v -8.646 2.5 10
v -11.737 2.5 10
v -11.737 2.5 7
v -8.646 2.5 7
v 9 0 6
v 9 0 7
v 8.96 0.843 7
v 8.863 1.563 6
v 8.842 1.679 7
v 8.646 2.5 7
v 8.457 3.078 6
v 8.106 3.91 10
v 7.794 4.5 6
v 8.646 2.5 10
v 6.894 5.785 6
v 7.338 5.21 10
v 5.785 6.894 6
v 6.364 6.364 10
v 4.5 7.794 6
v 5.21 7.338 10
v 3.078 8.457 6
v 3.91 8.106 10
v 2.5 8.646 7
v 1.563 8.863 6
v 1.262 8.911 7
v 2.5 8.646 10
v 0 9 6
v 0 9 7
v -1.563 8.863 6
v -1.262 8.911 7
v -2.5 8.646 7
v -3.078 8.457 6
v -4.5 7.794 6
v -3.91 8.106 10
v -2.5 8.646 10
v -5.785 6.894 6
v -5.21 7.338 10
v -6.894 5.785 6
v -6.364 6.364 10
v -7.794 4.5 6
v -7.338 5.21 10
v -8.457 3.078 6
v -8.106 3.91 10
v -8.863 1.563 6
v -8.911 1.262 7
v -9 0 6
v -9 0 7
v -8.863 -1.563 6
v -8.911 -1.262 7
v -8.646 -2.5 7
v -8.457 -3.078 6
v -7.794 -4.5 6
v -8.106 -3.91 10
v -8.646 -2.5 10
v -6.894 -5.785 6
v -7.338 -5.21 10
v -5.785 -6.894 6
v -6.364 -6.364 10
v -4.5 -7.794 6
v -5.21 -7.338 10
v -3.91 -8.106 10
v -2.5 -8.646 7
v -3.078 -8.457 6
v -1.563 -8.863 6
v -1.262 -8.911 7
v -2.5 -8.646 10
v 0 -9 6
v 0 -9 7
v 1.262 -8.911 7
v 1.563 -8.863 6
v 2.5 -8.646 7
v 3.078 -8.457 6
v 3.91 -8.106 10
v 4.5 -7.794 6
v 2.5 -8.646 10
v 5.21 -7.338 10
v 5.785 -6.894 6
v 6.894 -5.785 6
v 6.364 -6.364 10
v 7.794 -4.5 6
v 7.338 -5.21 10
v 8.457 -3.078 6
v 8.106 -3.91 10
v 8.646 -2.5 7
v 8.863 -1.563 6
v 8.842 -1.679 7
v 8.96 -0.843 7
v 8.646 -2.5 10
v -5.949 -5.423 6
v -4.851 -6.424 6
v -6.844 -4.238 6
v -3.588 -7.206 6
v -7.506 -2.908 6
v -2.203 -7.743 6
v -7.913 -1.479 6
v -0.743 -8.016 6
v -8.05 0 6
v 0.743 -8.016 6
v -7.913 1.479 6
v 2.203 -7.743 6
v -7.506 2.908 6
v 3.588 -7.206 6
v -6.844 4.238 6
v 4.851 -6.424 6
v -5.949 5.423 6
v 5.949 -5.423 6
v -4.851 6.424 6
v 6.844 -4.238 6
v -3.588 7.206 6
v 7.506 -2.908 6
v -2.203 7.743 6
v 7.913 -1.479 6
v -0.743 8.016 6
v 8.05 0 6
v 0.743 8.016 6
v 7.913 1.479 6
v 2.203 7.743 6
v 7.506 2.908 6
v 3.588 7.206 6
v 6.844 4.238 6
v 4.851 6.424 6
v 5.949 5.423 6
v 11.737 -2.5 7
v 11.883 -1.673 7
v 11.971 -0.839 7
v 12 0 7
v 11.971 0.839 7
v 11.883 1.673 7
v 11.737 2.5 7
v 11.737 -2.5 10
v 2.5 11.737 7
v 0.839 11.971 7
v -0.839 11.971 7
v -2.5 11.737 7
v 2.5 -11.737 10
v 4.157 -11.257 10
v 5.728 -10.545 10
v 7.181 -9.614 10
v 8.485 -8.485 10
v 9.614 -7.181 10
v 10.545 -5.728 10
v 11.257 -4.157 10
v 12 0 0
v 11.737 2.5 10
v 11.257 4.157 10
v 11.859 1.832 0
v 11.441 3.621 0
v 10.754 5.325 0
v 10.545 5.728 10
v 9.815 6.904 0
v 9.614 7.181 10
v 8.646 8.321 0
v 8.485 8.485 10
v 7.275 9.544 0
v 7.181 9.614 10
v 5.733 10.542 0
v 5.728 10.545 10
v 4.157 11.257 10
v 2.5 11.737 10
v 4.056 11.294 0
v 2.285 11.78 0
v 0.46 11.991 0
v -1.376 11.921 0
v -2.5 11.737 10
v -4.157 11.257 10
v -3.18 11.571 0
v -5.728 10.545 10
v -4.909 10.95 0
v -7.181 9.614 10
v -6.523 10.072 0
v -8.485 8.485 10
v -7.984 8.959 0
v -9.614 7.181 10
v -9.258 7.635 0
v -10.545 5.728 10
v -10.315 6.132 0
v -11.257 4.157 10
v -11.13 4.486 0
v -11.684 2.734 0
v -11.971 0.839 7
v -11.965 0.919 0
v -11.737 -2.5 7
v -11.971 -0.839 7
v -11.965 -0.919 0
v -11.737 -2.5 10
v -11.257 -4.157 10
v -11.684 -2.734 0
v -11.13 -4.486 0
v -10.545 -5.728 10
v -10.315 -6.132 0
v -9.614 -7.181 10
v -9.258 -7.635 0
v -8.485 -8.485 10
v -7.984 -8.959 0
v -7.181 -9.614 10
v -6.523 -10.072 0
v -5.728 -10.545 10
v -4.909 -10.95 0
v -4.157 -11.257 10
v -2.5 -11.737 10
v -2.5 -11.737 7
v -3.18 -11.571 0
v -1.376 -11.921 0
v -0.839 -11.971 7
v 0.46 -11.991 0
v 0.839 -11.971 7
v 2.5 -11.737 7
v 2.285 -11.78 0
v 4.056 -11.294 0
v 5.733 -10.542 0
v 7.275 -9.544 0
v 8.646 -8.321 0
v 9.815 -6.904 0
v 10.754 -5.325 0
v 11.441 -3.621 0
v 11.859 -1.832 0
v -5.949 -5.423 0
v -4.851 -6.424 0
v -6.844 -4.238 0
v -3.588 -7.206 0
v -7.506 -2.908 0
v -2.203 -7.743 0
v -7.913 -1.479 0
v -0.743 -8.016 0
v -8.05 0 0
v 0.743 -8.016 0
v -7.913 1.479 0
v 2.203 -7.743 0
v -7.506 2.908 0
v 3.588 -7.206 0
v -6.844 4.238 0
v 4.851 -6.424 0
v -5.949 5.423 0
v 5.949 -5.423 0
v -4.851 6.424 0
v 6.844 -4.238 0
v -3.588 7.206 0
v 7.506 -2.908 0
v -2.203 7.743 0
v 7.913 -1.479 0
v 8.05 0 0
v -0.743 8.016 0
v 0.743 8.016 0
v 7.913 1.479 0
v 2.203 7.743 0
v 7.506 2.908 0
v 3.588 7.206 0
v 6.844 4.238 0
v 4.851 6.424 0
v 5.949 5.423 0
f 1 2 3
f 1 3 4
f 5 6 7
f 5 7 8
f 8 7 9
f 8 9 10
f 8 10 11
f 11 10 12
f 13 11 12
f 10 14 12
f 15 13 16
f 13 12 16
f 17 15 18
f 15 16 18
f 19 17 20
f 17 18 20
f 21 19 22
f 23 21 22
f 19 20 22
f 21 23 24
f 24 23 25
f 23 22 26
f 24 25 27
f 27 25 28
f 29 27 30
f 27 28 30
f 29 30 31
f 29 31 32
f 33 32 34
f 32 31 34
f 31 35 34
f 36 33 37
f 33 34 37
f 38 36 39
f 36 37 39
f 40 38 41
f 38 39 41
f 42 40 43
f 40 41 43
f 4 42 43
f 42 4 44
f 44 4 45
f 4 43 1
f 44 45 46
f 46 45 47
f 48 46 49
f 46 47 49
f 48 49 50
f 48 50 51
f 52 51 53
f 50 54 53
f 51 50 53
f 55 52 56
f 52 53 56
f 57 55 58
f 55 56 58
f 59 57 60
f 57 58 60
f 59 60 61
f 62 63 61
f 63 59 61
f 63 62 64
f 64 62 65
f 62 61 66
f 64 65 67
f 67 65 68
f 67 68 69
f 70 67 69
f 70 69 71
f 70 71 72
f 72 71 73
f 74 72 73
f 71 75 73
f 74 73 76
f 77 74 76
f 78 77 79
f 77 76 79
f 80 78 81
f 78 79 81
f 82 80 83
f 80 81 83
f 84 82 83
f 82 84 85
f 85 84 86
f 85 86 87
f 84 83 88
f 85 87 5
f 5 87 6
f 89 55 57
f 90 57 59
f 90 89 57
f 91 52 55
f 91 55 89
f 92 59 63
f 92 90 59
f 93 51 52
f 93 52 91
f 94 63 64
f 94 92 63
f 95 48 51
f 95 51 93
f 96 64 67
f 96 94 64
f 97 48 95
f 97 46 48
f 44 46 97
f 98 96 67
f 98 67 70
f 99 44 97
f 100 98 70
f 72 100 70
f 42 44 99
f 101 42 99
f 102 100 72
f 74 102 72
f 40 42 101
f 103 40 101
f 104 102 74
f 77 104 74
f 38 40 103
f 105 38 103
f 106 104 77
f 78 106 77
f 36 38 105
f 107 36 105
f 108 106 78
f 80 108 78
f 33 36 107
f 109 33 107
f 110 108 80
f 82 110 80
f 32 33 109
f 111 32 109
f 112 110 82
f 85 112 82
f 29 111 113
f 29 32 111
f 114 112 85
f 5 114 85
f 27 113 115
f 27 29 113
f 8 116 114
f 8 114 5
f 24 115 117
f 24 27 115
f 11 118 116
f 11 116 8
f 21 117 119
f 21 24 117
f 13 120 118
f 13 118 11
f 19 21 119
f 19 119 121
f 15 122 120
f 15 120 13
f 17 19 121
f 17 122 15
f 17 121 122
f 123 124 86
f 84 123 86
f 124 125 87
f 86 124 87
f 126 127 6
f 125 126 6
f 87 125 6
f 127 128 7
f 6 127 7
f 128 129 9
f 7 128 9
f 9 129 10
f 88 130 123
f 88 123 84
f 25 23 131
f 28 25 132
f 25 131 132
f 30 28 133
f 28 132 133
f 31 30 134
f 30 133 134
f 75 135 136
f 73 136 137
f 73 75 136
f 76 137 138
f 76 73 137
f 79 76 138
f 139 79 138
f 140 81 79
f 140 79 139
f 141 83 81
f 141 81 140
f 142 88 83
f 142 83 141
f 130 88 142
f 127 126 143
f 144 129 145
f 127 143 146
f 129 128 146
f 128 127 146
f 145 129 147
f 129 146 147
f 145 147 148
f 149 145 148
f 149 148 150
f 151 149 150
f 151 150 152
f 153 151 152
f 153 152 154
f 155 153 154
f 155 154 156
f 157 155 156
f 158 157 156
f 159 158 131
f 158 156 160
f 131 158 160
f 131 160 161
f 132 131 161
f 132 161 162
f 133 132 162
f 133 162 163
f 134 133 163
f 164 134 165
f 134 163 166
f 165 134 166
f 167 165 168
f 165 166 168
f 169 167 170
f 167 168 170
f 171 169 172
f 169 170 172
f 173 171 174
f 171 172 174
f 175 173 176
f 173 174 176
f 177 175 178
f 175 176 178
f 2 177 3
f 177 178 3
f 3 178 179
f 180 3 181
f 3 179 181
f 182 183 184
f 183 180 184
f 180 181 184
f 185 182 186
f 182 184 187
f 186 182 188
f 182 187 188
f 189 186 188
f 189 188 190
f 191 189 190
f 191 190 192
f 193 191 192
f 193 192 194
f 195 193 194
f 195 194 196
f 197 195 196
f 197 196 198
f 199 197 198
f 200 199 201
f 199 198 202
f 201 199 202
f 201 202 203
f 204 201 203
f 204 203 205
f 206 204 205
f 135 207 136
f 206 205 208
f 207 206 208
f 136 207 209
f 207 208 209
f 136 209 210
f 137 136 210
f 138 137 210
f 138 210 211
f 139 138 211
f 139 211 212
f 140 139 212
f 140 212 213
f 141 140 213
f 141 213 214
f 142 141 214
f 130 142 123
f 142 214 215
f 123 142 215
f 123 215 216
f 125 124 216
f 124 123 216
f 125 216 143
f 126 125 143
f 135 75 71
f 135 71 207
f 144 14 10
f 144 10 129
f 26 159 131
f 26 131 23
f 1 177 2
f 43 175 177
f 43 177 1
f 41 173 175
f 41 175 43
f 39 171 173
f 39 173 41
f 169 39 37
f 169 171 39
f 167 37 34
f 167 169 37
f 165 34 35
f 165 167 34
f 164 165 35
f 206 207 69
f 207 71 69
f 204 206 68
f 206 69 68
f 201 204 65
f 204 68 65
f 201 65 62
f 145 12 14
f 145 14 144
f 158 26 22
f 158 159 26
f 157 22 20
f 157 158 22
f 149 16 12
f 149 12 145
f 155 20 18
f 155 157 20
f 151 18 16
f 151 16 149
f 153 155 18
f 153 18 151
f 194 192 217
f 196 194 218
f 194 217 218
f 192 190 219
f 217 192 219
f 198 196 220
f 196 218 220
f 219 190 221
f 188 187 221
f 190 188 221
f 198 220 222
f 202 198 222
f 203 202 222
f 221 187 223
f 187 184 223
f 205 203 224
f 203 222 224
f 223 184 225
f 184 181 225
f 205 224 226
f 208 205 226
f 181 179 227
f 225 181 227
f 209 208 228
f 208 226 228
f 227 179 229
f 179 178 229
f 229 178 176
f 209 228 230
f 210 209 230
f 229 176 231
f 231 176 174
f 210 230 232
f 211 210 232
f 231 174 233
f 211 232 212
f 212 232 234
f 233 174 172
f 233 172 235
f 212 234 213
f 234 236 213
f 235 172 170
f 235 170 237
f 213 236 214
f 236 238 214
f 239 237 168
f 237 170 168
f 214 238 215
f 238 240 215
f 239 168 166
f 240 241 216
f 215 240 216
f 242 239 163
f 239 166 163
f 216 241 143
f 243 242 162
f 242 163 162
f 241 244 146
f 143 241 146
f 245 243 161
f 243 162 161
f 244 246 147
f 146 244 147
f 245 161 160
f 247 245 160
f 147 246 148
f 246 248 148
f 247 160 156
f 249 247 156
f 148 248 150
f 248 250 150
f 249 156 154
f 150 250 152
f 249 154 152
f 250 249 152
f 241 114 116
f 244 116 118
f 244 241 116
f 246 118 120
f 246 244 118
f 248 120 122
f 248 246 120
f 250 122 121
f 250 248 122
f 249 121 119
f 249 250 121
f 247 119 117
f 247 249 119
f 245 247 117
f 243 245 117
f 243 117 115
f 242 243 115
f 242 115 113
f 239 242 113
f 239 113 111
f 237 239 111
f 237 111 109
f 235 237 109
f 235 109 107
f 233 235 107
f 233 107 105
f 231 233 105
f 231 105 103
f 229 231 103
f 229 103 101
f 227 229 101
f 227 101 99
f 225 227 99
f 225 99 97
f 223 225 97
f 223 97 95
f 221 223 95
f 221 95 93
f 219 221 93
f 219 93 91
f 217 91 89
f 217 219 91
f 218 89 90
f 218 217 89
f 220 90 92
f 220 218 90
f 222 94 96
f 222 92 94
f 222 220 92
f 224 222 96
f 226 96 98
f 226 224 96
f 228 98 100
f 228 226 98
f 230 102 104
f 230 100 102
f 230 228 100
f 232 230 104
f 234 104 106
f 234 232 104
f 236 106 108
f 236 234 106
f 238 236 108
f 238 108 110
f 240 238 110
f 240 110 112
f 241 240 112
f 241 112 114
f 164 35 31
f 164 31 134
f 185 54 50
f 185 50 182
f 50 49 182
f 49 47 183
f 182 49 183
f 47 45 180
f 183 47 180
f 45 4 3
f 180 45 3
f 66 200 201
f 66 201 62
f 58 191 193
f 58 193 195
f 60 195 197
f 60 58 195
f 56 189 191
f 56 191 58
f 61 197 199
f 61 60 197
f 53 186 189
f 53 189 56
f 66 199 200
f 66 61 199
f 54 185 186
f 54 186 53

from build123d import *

# Parameters (mm, degrees)
SKETCH_1_R          = 12
SKETCH_1_R_2        = 8.05
EXTRUDE_1_DEPTH     = 10
CUT_EXTRUDE_1_DEPTH = 3
SKETCH_4_R          = 9
CUT_EXTRUDE_2_DEPTH = 4


with BuildPart() as part:
    # 草图1 → 凸台-拉伸1 (new body)
    with BuildSketch(Plane.XY):
        Circle(SKETCH_1_R)
        Circle(SKETCH_1_R_2, mode=Mode.SUBTRACT)
    extrude(amount=EXTRUDE_1_DEPTH)

    # 草图3 → 切除-拉伸1 (cut)
    with BuildSketch(Plane.XY.offset(10)):
        Polygon((-16.5, 2.5), (-2.5, 2.5), (-2.5, 16.5), (2.5, 16.5), (2.5, 2.5), (16.5, 2.5), (16.5, -2.5), (2.5, -2.5), (2.5, -16.5), (-2.5, -16.5), (-2.5, -2.5), (-16.5, -2.5), align=None)
    extrude(amount=-CUT_EXTRUDE_1_DEPTH, mode=Mode.SUBTRACT)

    # 草图4 → 切除-拉伸2 (cut)
    with BuildSketch(Plane.XY.offset(10)):
        Circle(SKETCH_4_R)
    extrude(amount=-CUT_EXTRUDE_2_DEPTH, mode=Mode.SUBTRACT)


solid = part.part
